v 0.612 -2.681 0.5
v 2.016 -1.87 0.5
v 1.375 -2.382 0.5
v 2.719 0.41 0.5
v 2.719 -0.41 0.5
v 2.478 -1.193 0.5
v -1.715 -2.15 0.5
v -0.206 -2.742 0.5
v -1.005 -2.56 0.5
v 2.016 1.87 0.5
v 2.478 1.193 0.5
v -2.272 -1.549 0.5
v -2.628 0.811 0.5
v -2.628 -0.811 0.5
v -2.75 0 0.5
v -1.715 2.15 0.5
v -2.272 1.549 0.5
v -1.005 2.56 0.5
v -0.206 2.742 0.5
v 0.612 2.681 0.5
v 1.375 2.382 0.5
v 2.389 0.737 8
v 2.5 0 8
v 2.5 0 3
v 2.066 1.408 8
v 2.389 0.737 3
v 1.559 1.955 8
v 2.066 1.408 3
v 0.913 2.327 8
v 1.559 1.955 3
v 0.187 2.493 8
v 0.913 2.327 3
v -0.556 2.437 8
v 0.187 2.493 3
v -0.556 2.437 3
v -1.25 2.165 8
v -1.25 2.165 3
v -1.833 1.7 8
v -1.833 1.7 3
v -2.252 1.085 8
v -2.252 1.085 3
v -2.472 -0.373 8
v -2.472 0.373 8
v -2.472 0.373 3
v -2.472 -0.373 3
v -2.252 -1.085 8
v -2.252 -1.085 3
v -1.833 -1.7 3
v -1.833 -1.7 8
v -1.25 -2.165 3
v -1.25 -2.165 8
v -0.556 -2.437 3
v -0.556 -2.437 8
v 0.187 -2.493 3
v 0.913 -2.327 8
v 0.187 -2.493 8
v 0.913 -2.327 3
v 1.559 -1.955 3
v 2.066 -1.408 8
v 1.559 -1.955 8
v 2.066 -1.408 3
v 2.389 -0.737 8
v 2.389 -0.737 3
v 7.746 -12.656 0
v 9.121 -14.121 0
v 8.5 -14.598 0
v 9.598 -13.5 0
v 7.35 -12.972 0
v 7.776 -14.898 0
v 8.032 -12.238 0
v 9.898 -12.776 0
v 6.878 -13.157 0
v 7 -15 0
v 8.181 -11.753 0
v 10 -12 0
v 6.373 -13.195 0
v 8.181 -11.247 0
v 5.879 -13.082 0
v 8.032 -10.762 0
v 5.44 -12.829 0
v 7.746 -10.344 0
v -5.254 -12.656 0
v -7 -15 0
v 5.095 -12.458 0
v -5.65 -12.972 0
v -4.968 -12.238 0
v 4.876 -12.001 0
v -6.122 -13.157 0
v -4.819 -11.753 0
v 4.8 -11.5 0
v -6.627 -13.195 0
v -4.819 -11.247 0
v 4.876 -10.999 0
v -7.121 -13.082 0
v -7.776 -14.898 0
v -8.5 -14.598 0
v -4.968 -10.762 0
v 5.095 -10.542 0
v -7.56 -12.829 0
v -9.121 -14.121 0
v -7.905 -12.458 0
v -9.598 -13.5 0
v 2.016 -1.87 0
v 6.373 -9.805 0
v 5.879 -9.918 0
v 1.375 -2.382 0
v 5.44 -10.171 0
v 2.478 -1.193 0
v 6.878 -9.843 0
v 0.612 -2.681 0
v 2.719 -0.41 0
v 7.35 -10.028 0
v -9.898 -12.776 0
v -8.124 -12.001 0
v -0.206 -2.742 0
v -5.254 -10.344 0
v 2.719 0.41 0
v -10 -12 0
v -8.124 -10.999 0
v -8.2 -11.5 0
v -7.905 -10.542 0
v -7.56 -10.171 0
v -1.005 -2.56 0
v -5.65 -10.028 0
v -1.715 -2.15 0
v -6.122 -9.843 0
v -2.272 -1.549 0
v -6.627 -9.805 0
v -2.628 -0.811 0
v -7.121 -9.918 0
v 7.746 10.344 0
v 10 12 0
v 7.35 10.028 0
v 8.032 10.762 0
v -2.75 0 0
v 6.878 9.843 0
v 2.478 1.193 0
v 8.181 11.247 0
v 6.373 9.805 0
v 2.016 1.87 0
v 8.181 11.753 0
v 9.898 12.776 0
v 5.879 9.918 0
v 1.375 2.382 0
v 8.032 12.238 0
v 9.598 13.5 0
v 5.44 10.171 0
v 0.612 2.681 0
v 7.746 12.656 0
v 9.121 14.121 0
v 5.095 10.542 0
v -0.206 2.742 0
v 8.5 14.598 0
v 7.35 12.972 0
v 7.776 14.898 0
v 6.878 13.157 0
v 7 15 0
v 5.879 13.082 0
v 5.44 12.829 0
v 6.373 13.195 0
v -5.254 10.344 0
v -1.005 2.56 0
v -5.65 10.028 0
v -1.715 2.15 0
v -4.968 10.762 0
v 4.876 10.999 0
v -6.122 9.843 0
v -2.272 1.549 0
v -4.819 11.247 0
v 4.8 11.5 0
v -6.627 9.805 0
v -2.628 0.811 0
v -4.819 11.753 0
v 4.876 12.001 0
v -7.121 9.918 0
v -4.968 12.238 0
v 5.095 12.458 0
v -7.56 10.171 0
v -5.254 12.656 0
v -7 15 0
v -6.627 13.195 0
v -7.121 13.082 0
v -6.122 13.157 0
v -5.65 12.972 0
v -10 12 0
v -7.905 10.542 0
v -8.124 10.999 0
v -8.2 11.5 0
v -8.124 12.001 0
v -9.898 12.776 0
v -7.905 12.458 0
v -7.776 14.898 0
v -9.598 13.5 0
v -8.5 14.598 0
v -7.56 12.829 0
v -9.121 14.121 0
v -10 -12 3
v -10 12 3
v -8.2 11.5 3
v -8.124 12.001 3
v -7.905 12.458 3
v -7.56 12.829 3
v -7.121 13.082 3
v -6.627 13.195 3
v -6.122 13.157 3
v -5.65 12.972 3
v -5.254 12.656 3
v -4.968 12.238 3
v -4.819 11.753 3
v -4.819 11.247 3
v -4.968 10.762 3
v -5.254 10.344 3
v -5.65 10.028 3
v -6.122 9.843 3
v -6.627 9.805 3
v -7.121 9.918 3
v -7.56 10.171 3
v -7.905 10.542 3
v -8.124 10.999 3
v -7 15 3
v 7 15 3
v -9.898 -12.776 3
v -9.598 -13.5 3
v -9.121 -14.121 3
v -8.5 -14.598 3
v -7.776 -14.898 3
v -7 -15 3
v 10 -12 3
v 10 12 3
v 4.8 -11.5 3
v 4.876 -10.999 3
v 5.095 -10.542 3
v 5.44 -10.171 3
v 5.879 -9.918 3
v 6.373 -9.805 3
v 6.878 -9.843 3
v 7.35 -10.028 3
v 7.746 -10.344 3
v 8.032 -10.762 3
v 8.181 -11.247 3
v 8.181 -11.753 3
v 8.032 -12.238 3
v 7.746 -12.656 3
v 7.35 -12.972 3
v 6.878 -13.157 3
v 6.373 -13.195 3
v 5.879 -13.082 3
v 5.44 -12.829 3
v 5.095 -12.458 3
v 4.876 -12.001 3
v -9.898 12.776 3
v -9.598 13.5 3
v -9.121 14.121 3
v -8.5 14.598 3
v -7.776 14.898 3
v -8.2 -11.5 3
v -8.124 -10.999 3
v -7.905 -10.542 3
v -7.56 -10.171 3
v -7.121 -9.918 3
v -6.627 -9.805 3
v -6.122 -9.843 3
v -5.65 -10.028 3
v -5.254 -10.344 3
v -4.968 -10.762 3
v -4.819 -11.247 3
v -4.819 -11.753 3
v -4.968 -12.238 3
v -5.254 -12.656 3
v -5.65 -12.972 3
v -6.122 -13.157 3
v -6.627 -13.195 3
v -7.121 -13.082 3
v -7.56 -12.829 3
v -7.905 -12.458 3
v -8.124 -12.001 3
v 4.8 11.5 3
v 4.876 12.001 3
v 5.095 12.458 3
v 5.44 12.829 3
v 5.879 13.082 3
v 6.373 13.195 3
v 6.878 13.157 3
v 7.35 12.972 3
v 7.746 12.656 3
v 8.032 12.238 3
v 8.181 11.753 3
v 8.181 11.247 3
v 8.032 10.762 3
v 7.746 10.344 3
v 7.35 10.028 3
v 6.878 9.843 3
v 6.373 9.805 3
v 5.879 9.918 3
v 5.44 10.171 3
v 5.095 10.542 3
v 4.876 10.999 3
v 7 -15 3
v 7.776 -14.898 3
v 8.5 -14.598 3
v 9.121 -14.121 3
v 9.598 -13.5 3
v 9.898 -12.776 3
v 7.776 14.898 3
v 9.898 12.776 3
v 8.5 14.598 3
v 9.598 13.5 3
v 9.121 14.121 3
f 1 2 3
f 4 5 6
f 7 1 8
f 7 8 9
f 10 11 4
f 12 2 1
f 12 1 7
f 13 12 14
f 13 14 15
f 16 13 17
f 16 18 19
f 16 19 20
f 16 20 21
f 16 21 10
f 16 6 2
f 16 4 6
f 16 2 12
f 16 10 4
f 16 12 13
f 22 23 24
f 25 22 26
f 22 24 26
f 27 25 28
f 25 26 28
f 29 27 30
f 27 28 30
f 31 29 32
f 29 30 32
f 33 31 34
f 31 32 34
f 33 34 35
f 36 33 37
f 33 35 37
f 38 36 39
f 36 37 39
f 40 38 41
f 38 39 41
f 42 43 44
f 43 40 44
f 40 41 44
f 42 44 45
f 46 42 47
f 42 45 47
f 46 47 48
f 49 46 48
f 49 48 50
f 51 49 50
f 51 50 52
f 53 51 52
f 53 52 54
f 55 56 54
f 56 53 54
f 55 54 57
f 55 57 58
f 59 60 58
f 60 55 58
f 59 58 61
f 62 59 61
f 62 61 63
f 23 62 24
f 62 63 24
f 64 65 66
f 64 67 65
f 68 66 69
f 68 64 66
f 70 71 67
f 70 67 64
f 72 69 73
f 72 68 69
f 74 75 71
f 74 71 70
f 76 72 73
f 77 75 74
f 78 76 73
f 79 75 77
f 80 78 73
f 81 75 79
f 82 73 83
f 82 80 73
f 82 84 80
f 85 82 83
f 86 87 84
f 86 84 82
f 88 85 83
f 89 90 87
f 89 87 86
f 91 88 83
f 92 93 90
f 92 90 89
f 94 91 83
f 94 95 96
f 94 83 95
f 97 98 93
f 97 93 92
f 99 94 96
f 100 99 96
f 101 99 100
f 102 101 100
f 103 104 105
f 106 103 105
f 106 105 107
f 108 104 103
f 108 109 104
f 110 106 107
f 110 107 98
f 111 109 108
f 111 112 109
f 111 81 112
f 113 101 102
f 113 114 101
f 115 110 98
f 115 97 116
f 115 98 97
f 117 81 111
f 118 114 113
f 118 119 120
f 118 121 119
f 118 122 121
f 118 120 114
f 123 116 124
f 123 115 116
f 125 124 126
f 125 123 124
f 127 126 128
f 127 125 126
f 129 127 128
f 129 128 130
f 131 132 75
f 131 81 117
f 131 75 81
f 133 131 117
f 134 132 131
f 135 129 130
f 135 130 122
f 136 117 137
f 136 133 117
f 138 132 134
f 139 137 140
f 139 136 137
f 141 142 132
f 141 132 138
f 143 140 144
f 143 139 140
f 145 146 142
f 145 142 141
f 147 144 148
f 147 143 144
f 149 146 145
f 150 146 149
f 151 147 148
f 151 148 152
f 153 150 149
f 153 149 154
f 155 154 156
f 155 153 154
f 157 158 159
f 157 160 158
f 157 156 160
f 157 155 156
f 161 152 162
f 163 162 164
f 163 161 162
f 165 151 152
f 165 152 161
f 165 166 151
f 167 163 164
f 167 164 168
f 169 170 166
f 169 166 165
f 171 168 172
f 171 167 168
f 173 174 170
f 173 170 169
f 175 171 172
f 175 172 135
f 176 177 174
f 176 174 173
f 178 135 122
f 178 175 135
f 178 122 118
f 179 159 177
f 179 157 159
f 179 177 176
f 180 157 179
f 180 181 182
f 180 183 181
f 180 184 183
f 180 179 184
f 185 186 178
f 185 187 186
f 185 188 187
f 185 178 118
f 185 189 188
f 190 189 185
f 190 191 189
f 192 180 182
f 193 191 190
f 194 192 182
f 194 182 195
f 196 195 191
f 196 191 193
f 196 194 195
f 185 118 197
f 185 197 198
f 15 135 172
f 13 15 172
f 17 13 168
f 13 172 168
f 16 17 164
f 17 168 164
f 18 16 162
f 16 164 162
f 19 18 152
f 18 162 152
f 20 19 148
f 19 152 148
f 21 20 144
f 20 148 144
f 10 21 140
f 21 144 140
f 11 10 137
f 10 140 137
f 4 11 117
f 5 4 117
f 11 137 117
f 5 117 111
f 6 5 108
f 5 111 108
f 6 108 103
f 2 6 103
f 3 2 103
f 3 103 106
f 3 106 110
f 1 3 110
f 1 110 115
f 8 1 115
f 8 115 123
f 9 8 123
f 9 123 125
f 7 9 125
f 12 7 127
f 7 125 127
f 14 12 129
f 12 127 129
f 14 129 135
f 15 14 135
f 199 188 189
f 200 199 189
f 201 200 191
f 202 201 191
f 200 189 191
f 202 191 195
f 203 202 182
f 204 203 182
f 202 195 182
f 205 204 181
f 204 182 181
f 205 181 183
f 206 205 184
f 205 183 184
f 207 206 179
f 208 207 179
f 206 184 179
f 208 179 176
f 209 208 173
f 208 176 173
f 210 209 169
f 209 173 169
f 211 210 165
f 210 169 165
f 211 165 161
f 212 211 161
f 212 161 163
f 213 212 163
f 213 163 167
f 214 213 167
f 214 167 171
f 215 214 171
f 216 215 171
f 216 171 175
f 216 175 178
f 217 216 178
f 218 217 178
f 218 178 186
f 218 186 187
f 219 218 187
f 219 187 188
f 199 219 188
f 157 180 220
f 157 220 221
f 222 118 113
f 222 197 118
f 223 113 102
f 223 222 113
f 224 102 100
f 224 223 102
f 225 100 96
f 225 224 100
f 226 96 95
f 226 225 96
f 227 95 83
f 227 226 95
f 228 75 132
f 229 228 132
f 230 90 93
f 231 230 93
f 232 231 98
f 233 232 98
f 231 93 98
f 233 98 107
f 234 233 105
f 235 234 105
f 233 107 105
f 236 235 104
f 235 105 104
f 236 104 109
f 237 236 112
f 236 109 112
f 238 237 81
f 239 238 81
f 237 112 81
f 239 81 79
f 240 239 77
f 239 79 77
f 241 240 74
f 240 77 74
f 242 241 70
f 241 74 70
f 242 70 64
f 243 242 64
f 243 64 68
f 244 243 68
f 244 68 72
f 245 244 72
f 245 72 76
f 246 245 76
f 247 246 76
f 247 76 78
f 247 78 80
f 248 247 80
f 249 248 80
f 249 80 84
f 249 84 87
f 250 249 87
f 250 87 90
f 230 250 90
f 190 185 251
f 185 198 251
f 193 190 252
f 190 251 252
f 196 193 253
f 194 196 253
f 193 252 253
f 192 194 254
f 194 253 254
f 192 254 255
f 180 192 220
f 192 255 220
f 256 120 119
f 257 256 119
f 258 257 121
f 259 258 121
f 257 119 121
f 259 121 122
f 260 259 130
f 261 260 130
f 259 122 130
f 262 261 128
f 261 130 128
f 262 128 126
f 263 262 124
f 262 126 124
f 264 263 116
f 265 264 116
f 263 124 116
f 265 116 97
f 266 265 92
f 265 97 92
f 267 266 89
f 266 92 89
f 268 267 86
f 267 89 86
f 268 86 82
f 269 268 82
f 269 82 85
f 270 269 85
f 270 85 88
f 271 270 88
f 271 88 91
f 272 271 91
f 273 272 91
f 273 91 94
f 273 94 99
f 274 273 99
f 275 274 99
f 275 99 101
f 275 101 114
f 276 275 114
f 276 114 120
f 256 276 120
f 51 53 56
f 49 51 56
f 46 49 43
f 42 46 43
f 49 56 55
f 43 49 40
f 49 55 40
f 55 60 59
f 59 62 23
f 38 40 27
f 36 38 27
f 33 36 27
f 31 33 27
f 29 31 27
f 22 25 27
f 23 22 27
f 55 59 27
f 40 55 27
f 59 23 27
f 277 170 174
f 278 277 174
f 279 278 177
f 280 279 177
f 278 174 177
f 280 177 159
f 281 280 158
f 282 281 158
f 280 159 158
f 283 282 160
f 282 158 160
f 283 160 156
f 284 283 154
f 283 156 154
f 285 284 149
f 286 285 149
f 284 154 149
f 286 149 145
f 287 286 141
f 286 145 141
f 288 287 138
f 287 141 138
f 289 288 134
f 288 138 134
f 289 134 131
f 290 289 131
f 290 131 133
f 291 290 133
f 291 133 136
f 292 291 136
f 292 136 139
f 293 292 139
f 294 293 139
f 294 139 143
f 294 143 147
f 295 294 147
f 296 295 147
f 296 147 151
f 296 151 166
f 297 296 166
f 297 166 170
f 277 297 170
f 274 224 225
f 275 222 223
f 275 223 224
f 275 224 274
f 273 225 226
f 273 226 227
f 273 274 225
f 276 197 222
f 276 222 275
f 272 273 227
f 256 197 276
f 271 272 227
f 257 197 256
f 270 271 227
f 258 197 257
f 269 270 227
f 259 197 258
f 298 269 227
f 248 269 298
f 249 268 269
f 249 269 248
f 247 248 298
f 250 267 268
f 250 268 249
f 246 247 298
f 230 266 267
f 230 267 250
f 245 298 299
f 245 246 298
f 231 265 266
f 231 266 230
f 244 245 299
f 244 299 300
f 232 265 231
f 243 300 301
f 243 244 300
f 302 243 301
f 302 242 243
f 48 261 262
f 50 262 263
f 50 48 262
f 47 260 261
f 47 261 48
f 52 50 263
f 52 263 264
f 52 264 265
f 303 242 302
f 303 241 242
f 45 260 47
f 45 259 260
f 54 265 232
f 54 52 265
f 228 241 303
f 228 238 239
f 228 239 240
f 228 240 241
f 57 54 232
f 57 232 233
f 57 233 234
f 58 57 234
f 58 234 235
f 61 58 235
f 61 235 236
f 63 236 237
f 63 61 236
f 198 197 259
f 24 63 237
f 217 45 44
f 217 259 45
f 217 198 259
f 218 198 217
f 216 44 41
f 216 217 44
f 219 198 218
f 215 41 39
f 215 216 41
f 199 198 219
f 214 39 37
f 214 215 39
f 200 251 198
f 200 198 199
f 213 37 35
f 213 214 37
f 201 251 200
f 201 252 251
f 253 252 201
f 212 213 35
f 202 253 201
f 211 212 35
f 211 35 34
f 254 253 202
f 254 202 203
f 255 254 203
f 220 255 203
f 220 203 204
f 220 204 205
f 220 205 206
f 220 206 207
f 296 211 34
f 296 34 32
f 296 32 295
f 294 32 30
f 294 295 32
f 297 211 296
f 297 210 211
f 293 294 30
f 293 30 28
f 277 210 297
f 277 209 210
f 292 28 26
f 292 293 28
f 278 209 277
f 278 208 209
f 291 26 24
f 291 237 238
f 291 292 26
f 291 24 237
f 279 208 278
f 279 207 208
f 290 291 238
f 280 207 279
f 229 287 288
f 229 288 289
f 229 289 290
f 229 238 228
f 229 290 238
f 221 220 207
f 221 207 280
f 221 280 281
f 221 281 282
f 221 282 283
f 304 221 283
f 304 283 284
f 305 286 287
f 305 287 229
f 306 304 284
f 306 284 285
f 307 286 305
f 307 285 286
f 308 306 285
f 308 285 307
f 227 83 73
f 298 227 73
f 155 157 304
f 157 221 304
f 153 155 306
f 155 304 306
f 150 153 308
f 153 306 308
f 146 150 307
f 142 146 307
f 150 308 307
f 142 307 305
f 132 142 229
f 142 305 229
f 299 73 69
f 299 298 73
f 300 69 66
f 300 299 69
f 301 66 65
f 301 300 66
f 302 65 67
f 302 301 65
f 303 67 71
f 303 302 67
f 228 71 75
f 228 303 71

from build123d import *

# Parameters (mm, degrees)
SKETCH1_W                  = 20
SKETCH1_H                  = 30
BOSS_EXTRUDE1_DEPTH        = 3
F_3_4_3_4_DIAMETER_HOLE1_D = 3.4
SKETCH5_R                  = 3.4
CUT_EXTRUDE1_DEPTH         = 0.5
FILLET1_R                  = 3
SKETCH7_W                  = 8
SKETCH7_H                  = 15
BOSS_EXTRUDE3_DEPTH        = 11
CUT_EXTRUDE3_DEPTH         = 25.839484697
CUT_EXTRUDE3_DEPTH_BACK    = 25.839484697
SKETCH11_OUTSIDE_W         = 29.736
SKETCH11_OUTSIDE_H         = 39.736
SKETCH11_OUTSIDE_R         = 2.5
CUT_EXTRUDE4_DEPTH         = 22.118712082
SKETCH12_W                 = 7.43023475
SKETCH12_H                 = 21.108621448
CUT_EXTRUDE5_DEPTH         = 29.653097564
SKETCH13_R                 = 3.4
SKETCH13_R_2               = 2.75
BOSS_EXTRUDE4_DEPTH        = 0.5


with BuildPart() as part:
    # Sketch1 → Boss-Extrude1 (new body)
    with BuildSketch(Plane.XY):
        Rectangle(SKETCH1_W, SKETCH1_H)
    extrude(amount=BOSS_EXTRUDE1_DEPTH)

    # Ø3.4 (3.4) Diameter Hole1 (through all)
    with Locations(Plane.XY.offset(3)):
        with Locations((-6.5, 11.5), (6.5, 11.5), (6.5, -11.5), (-6.5, -11.5)):
            Hole(F_3_4_3_4_DIAMETER_HOLE1_D / 2)

    # Sketch5 → Cut-Extrude1 (cut)
    with BuildSketch(Plane(origin=(0, 0, 0), x_dir=(-1, 0, 0), z_dir=(0, 0, -1))):
        Circle(SKETCH5_R)
    extrude(amount=-CUT_EXTRUDE1_DEPTH, mode=Mode.SUBTRACT)

    # Fillet1
    fillet1_edges = [part.edges().sort_by_distance(p)[0] for p in [
        (10, -15, 1.5),
        (-10, -15, 1.5),
        (-10, 15, 1.5),
        (10, 15, 1.5),
    ]]
    fillet(fillet1_edges, radius=FILLET1_R)

    # Sketch7 → Boss-Extrude3 (add)
    with BuildSketch(Plane.XY.offset(3)):
        Rectangle(SKETCH7_W, SKETCH7_H)
    extrude(amount=BOSS_EXTRUDE3_DEPTH)

    # Sketch8 → Cut-Extrude3 (cut, two sides: drawn at the far end of the back side and taken through both)
    with BuildSketch(Plane(origin=(4, 0, 0), x_dir=(0, 0, -1), z_dir=(1, 0, 0)).offset(-CUT_EXTRUDE3_DEPTH_BACK)):
        Polygon((-14, -6), (-14, -7), (-13.133974596, -6.5), align=None)
        Polygon((-13.133974596, -7.5), (-14, -7), (-14, -7.5), align=None)
        Polygon((-14, -5), (-14, -6), (-13.133974596, -5.5), align=None)
        Polygon((-14, -4), (-14, -5), (-13.133974596, -4.5), align=None)
        Polygon((-14, -3), (-14, -4), (-13.133974596, -3.5), align=None)
        Polygon((-14, 7), (-13.133974596, 7.5), (-14, 7.5), align=None)
        Polygon((-14, -2), (-14, -3), (-13.133974596, -2.5), align=None)
        Polygon((-13.133974596, 6.5), (-14, 7), (-14, 6), align=None)
        Polygon((-14, -1), (-14, -2), (-13.133974596, -1.5), align=None)
        Polygon((-13.133974596, 5.5), (-14, 6), (-14, 5), align=None)
        Polygon((-14, 0), (-14, -1), (-13.133974596, -0.5), align=None)
        Polygon((-13.133974596, 4.5), (-14, 5), (-14, 4), align=None)
        Polygon((-14, 1), (-14, 0), (-13.133974596, 0.5), align=None)
        Polygon((-13.133974596, 3.5), (-14, 4), (-14, 3), align=None)
        Polygon((-14, 2), (-14, 1), (-13.133974596, 1.5), align=None)
        Polygon((-13.133974596, 2.5), (-14, 3), (-14, 2), align=None)
    extrude(amount=CUT_EXTRUDE3_DEPTH + CUT_EXTRUDE3_DEPTH_BACK, mode=Mode.SUBTRACT)

    # Sketch11 outside → Cut-Extrude4 (cut, through all)
    with BuildSketch(Plane.XY.offset(3)):
        Rectangle(SKETCH11_OUTSIDE_W, SKETCH11_OUTSIDE_H)
        Circle(SKETCH11_OUTSIDE_R, mode=Mode.SUBTRACT)
    extrude(amount=CUT_EXTRUDE4_DEPTH, mode=Mode.SUBTRACT)

    # Sketch12 → Cut-Extrude5 (cut, through all)
    with BuildSketch(Plane(origin=(10, 0, 0), x_dir=(0, 0, -1), z_dir=(1, 0, 0))):
        with Locations((-11.715117375, -0.112579314)):
            Rectangle(SKETCH12_W, SKETCH12_H)
    extrude(amount=-CUT_EXTRUDE5_DEPTH, mode=Mode.SUBTRACT)

    # Sketch13 → Boss-Extrude4 (add)
    with BuildSketch(Plane(origin=(0, 0, 0), x_dir=(-1, 0, 0), z_dir=(0, 0, -1))):
        Circle(SKETCH13_R)
        Circle(SKETCH13_R_2, mode=Mode.SUBTRACT)
    extrude(amount=-BOSS_EXTRUDE4_DEPTH)


solid = part.part
